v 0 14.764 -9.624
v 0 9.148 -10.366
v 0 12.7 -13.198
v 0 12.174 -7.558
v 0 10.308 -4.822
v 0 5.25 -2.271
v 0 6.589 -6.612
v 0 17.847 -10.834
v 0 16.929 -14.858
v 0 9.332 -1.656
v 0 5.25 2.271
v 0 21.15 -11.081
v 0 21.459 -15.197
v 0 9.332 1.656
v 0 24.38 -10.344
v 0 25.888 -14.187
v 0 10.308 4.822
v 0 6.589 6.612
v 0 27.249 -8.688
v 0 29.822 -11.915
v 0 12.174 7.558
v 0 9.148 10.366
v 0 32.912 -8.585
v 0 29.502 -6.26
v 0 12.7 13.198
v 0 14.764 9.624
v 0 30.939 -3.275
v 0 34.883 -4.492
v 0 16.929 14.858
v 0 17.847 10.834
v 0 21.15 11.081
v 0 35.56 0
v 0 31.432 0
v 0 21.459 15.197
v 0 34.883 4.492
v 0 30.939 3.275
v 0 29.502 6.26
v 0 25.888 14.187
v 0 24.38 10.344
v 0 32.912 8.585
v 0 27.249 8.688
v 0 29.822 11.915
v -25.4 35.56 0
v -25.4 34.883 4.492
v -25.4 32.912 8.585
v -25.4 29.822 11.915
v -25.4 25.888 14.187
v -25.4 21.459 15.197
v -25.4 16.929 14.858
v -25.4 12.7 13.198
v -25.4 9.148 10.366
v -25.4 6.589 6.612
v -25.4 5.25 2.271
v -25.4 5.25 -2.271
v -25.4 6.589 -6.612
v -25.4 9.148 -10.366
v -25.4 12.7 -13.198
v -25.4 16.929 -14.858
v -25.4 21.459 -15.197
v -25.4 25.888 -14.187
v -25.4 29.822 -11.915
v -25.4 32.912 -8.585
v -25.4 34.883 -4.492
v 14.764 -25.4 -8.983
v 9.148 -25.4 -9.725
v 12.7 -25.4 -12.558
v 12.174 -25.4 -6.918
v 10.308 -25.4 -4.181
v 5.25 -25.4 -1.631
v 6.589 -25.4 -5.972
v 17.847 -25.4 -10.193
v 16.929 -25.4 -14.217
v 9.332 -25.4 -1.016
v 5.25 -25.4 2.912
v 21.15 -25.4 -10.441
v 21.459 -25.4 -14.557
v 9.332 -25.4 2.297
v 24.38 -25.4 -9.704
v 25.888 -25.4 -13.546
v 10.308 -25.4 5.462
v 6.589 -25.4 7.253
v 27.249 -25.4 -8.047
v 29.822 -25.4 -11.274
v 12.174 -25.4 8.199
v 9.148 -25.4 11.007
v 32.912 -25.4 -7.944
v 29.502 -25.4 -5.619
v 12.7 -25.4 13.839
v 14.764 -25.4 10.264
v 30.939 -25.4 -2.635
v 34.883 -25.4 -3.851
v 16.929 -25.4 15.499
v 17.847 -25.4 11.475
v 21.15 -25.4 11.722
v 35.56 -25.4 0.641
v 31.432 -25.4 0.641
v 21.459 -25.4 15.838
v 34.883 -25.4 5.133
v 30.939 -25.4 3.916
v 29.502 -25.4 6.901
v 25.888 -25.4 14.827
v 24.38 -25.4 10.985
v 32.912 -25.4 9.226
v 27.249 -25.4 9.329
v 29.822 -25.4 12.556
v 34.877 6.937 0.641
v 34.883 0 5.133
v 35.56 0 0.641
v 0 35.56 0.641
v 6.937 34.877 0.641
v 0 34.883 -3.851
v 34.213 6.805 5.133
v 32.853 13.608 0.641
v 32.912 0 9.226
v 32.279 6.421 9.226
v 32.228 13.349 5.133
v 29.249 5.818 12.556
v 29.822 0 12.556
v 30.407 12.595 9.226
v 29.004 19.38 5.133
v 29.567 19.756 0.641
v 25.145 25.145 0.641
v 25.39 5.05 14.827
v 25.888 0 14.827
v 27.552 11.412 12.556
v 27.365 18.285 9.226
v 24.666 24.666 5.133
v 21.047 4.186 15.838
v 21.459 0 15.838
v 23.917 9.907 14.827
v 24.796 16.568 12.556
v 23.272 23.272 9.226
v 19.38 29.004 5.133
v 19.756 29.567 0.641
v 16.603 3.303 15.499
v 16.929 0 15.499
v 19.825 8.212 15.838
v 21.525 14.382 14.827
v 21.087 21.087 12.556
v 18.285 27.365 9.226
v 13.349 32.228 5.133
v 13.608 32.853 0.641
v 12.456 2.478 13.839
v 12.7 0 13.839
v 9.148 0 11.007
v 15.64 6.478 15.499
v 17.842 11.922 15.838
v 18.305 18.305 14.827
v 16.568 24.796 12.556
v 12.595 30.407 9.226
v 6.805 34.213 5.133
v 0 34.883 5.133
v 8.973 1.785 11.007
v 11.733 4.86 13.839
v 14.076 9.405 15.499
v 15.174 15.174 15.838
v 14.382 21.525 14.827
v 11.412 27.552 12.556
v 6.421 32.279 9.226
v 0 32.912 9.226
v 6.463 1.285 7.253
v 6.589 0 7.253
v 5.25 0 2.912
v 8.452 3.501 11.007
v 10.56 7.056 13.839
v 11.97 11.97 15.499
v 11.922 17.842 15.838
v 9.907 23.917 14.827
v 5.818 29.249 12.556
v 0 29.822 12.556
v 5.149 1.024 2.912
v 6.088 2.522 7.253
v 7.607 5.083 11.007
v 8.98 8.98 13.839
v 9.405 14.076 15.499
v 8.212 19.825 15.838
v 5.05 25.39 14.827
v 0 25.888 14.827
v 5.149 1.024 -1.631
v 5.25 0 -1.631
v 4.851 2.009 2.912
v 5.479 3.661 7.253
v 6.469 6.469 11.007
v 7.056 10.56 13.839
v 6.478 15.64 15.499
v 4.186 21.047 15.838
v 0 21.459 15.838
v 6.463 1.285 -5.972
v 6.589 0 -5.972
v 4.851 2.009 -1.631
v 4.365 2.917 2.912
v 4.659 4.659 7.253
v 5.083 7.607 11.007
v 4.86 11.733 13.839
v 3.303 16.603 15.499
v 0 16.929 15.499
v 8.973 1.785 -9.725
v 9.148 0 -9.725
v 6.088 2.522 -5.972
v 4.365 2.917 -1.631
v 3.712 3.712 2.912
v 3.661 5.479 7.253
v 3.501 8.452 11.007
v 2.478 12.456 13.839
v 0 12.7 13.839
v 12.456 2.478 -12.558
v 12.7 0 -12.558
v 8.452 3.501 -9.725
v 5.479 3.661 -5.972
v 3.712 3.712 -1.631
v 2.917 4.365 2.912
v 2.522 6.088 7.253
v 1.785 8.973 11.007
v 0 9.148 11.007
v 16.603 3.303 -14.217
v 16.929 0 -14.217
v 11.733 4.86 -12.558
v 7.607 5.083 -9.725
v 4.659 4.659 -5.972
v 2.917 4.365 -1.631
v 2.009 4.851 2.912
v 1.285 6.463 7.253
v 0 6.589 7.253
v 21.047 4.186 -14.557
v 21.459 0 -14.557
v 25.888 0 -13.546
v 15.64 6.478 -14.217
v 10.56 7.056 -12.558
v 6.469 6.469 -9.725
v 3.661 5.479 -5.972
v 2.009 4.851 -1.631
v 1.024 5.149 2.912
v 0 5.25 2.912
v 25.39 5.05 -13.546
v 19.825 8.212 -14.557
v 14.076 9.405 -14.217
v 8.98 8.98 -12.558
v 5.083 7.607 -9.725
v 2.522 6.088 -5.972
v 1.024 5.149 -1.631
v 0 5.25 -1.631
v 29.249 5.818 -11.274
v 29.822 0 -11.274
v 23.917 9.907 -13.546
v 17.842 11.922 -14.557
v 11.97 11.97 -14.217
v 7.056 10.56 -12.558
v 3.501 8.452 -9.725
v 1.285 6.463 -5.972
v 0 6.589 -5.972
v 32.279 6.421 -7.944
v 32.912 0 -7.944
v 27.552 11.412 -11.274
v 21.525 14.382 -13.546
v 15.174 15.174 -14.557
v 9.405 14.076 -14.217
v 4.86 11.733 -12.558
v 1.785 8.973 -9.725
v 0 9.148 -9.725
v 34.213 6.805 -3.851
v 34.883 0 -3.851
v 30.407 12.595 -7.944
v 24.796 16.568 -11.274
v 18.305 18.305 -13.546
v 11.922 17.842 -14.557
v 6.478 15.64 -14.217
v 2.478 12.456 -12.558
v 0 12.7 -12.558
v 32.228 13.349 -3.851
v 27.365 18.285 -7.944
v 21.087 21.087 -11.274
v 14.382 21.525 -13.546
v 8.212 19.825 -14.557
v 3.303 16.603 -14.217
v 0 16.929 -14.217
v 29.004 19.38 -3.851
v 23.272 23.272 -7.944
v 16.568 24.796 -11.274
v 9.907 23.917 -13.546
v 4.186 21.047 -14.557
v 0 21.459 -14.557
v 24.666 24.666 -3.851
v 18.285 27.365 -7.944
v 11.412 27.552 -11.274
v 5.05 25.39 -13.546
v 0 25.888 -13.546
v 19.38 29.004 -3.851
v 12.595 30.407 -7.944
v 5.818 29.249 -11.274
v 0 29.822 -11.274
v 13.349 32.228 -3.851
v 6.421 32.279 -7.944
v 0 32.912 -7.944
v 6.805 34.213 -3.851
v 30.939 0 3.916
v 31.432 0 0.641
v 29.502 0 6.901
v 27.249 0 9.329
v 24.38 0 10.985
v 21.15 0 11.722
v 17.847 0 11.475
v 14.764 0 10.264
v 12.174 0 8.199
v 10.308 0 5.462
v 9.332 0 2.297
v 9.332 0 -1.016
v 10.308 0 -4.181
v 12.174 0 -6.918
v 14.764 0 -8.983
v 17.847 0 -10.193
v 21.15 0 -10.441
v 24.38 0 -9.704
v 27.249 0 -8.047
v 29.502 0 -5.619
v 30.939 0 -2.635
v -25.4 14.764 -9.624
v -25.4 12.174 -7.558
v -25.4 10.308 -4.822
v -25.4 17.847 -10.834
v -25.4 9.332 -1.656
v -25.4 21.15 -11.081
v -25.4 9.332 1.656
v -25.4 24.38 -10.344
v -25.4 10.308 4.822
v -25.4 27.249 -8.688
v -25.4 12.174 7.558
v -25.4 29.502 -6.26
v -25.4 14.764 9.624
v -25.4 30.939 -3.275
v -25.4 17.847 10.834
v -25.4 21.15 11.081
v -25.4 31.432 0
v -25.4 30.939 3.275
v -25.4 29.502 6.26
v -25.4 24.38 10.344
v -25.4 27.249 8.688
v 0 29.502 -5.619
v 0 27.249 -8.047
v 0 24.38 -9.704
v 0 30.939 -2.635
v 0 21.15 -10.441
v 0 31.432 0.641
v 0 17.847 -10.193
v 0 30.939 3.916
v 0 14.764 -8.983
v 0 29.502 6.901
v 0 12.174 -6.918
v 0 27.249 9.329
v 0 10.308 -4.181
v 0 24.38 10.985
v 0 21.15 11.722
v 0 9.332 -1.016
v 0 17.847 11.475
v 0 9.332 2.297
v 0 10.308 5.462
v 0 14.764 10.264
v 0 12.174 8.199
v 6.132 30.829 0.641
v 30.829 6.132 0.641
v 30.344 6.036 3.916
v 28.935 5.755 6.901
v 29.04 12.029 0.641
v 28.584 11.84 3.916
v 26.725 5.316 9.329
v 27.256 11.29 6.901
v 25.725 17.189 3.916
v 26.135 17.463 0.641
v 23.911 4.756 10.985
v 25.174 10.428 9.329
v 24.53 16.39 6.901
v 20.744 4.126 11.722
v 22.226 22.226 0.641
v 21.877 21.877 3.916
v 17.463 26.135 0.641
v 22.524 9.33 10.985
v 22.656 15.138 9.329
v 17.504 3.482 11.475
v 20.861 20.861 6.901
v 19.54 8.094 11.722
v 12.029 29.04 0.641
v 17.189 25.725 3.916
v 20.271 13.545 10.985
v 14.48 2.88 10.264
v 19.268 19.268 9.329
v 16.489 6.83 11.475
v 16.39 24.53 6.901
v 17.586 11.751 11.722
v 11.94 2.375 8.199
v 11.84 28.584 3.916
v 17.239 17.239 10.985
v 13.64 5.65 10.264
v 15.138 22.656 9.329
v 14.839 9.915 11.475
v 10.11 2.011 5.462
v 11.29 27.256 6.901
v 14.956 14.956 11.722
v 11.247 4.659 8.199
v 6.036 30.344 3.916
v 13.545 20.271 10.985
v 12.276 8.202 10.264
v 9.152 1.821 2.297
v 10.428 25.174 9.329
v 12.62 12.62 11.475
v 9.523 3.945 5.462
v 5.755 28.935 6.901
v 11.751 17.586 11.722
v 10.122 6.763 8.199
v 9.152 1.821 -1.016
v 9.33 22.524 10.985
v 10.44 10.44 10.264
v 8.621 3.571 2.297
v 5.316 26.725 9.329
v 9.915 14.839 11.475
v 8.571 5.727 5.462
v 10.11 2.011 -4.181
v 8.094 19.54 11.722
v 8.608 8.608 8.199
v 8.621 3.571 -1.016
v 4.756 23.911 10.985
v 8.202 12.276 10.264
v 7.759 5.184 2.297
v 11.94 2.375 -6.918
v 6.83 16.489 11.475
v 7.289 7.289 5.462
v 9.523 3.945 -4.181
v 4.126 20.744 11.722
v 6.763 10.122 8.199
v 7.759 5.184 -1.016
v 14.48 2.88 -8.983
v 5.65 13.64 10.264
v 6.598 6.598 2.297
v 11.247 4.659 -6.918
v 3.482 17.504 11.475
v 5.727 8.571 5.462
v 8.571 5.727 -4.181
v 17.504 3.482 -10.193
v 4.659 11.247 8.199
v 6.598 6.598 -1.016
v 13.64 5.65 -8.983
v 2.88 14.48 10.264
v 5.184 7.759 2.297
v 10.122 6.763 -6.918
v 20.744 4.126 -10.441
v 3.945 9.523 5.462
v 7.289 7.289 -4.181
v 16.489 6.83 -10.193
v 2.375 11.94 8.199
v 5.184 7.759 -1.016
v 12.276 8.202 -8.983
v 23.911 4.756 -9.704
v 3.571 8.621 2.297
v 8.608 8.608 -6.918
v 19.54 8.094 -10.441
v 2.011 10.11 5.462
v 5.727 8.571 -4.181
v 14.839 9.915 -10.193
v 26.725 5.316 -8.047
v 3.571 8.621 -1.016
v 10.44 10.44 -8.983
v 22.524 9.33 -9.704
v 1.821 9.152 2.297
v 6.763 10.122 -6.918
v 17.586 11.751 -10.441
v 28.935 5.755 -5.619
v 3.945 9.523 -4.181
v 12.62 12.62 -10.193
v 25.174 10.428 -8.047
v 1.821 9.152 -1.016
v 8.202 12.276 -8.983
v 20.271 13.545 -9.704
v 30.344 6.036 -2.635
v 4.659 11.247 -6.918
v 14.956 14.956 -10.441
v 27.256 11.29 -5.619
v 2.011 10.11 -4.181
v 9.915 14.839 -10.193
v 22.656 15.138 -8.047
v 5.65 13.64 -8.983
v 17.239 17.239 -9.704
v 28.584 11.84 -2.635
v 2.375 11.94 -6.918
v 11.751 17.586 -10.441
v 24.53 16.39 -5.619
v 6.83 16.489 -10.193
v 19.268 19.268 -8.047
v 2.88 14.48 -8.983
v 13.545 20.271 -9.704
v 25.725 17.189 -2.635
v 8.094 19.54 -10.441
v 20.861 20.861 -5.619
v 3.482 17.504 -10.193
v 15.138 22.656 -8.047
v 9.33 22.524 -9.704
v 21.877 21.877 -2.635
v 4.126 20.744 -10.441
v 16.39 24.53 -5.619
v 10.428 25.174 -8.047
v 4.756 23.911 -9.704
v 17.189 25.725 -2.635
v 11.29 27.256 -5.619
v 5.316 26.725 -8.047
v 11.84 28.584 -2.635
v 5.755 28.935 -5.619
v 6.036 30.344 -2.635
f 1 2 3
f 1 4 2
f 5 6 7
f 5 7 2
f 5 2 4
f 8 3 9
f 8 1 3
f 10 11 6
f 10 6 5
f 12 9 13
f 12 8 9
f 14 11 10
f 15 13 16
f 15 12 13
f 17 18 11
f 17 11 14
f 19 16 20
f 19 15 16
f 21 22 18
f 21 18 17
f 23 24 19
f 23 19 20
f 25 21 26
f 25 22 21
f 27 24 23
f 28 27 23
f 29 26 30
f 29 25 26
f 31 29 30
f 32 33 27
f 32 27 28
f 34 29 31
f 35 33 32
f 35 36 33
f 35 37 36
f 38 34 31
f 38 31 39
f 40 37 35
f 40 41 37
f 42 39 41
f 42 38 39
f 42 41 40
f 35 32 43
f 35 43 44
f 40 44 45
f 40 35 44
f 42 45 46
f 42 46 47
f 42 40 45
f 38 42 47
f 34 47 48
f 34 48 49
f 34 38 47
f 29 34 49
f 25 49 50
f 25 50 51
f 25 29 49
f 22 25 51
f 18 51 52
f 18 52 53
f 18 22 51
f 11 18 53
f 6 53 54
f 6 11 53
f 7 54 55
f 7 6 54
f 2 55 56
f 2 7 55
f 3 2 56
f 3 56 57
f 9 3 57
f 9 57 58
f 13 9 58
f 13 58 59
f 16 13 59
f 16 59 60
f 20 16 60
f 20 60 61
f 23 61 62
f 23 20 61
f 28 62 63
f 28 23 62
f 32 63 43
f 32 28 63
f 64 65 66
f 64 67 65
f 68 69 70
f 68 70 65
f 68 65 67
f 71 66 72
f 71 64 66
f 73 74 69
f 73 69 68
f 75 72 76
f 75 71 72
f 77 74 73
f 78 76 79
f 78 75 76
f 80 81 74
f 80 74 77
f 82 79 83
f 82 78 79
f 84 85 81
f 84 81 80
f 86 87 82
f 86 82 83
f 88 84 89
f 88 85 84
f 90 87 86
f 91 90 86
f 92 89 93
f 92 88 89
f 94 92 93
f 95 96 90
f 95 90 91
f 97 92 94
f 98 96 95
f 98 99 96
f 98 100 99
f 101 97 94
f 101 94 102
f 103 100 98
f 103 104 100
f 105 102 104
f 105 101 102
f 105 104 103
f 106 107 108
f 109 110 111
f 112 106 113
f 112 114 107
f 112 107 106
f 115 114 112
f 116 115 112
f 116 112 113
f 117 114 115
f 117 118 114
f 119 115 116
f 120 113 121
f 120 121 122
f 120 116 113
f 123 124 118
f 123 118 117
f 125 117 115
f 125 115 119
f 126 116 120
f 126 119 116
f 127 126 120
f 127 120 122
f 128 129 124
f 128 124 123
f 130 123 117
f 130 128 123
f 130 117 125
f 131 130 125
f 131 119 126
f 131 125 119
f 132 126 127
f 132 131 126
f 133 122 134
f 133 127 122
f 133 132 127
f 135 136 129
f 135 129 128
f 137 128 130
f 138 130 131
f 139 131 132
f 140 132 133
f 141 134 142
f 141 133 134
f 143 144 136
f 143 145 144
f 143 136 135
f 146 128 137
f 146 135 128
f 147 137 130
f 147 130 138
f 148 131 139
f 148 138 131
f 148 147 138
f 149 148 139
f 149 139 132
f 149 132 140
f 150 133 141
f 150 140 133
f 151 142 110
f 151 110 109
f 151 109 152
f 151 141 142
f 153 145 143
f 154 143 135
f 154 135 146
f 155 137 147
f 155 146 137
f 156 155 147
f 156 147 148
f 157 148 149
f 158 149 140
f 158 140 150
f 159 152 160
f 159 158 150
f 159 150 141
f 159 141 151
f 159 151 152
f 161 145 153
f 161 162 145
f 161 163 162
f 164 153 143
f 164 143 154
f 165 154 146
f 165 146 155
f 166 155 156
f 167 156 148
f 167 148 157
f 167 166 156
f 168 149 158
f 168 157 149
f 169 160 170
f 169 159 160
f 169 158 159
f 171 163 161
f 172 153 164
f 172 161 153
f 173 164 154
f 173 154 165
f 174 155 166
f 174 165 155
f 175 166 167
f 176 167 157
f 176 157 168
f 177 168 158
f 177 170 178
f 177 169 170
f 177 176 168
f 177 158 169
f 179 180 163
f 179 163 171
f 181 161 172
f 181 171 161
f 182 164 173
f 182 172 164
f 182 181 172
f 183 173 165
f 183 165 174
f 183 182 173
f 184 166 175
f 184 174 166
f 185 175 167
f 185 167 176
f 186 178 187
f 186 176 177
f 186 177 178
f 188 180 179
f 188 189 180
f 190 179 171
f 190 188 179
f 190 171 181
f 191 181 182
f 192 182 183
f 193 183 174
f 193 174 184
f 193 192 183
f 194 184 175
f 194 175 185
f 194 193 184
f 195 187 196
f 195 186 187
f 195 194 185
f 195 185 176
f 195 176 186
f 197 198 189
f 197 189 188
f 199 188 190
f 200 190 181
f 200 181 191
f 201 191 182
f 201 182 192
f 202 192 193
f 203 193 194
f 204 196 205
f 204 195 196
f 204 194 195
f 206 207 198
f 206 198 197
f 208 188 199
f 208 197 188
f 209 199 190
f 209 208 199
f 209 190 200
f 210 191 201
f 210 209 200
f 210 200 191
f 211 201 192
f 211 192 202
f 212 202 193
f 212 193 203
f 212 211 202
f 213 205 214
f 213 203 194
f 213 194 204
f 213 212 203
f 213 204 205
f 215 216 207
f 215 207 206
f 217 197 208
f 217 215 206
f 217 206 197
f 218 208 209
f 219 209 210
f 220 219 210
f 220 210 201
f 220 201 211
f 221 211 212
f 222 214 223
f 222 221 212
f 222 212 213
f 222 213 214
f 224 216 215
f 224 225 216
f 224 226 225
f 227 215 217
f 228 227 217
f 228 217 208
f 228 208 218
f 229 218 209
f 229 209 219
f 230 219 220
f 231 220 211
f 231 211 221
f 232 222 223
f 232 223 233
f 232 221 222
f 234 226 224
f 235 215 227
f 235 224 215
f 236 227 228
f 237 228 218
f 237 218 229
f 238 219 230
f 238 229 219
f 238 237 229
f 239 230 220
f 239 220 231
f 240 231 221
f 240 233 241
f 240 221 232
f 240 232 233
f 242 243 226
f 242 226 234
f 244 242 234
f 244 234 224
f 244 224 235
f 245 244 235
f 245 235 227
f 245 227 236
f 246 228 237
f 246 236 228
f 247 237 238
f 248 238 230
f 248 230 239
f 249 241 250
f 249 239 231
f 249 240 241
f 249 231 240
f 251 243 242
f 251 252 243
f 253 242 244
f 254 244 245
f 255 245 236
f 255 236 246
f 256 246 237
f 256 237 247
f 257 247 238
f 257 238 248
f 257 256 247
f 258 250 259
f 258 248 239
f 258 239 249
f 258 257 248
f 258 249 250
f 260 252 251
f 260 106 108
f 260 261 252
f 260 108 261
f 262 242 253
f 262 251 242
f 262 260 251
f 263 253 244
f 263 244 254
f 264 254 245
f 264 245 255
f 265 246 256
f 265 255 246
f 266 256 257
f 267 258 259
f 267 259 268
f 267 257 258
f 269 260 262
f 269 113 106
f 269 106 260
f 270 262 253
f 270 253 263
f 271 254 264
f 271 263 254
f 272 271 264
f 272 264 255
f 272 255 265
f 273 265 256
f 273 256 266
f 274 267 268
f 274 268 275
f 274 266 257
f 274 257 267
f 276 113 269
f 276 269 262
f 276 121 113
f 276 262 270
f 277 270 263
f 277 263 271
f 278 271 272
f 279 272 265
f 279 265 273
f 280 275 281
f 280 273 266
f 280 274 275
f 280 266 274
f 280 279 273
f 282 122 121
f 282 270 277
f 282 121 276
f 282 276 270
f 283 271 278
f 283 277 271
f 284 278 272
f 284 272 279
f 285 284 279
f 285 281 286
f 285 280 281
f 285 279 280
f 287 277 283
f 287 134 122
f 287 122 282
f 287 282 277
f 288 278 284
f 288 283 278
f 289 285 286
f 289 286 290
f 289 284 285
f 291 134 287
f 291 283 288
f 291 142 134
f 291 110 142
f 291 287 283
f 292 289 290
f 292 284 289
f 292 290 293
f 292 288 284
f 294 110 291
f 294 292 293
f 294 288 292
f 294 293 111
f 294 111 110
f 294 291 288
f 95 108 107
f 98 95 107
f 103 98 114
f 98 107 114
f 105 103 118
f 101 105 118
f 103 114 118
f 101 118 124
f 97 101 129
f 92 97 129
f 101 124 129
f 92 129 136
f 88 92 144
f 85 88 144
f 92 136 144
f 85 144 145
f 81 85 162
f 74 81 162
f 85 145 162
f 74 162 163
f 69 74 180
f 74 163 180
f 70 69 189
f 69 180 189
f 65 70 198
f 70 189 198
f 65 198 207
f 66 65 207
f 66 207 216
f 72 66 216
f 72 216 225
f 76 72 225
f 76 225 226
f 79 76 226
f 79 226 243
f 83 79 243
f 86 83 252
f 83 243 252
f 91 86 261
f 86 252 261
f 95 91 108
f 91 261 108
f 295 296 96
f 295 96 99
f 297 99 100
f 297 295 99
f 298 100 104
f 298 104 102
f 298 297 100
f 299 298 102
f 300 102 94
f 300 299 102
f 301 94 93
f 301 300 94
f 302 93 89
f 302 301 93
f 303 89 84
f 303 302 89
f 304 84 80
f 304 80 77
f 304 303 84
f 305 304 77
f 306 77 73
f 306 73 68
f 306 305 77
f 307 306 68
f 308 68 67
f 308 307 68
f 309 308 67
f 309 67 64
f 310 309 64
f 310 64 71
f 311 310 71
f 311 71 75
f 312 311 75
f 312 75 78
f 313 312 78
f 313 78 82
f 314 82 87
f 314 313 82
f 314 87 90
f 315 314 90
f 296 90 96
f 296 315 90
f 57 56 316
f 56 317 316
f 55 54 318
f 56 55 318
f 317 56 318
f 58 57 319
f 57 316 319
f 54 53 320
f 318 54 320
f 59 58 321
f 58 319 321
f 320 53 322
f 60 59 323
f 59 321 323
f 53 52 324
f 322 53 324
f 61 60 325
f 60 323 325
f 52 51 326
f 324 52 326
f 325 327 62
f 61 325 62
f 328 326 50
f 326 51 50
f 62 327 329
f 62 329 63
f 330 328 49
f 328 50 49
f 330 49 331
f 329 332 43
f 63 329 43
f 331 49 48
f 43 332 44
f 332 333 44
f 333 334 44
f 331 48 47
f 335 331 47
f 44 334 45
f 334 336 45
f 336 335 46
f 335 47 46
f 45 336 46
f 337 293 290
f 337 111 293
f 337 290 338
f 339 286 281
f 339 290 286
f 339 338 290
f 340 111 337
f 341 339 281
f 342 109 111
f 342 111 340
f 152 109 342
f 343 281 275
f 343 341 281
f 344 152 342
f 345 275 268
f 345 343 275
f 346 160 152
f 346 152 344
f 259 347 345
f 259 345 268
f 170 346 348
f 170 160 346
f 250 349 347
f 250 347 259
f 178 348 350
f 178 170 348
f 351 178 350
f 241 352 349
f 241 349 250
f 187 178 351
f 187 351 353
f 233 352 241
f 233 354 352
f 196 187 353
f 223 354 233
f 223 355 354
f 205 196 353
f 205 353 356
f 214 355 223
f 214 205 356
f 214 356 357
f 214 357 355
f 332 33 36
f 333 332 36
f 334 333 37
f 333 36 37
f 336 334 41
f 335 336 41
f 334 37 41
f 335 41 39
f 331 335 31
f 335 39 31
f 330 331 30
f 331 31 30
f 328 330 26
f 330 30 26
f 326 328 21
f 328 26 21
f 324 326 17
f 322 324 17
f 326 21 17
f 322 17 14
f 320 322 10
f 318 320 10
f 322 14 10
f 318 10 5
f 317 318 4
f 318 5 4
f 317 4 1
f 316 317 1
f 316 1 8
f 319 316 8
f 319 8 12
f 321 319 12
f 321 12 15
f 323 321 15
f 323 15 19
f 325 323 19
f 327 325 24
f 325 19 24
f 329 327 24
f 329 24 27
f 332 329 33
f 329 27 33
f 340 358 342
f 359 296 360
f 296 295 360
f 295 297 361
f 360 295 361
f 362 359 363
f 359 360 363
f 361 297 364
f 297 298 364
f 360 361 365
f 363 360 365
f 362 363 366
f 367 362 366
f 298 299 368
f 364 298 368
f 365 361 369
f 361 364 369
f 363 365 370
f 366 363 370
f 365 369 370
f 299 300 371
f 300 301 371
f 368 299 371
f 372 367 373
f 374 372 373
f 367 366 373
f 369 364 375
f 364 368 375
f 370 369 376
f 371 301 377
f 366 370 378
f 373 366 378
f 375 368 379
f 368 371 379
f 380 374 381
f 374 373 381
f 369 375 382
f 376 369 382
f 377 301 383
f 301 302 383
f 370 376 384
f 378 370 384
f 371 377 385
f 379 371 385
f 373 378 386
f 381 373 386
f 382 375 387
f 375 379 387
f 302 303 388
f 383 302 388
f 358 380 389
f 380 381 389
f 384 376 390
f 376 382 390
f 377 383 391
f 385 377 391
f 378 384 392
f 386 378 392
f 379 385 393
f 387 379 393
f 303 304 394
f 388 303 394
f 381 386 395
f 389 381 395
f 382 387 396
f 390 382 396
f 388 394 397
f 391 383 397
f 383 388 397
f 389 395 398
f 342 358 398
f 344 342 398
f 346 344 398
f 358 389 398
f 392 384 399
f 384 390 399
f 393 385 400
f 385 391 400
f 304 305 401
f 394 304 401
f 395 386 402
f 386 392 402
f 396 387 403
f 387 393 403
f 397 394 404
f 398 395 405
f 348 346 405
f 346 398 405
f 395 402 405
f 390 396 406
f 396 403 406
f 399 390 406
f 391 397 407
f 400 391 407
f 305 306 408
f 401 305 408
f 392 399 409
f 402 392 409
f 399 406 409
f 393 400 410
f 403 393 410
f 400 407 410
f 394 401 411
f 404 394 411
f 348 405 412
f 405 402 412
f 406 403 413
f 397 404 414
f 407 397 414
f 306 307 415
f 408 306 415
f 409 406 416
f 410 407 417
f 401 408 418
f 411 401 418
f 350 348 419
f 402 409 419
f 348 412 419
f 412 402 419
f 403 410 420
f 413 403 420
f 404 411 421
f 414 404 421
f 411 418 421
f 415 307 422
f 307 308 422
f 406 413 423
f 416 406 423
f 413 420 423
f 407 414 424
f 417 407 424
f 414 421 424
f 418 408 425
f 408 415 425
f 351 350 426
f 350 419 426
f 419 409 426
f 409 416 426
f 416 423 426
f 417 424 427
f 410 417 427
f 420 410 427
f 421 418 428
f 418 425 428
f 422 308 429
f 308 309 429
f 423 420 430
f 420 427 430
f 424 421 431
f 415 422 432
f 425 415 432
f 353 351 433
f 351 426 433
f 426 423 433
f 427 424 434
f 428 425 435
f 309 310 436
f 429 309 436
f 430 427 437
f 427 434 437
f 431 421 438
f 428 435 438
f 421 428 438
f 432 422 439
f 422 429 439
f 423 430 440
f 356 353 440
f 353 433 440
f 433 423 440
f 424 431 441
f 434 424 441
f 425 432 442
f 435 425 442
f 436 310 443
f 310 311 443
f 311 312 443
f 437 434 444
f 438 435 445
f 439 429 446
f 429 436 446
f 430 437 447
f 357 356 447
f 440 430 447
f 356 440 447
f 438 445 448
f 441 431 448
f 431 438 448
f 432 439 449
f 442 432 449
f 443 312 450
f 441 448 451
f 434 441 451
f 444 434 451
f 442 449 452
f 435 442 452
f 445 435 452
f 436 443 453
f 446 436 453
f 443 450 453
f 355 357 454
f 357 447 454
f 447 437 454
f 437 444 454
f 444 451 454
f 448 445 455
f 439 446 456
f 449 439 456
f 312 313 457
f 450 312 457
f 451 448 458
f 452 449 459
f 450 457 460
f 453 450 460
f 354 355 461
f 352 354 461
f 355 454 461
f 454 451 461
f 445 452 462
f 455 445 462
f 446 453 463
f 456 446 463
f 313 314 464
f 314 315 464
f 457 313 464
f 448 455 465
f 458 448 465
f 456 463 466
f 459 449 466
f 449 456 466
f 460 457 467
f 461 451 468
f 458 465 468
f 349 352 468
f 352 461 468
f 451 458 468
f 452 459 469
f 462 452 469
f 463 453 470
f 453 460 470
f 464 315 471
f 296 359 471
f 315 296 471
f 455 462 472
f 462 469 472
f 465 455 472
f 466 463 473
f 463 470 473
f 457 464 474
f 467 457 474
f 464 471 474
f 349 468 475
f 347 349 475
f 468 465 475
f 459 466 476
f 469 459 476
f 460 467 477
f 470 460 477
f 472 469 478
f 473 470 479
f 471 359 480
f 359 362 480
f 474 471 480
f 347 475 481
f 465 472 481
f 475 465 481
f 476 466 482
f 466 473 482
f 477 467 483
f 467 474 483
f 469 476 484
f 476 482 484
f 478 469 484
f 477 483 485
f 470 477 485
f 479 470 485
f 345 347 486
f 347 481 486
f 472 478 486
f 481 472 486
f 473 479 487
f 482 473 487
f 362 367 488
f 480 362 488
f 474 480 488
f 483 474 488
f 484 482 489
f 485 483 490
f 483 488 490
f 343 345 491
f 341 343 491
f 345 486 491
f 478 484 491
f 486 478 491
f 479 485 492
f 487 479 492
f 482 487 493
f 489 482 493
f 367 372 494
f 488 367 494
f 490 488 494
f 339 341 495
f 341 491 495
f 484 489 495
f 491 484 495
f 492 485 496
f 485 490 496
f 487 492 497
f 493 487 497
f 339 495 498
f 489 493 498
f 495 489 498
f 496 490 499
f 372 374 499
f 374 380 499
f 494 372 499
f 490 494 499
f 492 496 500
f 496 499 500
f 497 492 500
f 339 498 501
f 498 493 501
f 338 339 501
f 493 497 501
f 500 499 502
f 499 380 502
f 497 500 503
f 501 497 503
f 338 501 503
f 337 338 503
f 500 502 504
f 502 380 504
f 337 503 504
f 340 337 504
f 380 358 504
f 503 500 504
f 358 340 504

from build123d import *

# Parameters (mm, degrees)
F0_R        = 15.24
F0_R_2      = 11.1125
F2_DEPTH    = 25.4
F1_R        = 15.24
F1_R_2      = 11.1125
F3_DEPTH    = 25.4
F2_FACE_R   = 15.24
F2_FACE_R_2 = 11.1125


with BuildPart() as f2:
    # F0 (on Front) → F2 (new body)
    with BuildSketch(Plane.XZ):
        with Locations((20.32, 0.640698825)):
            Circle(F0_R)
        with Locations((20.32, 0.640698825)):
            Circle(F0_R_2, mode=Mode.SUBTRACT)
    extrude(amount=F2_DEPTH)

    # F5: sweep along a path in F4
    with BuildLine(Plane.XY) as f5_path:
        ThreePointArc((35.4710668325, 0), (25.0818318932, 25.0818318932), (0, 35.4710668325))
    # F2_face (on face) → F5 (sweep)
    with BuildSketch(Plane(origin=(20.32, 0, 0.640698825), x_dir=(1, 0, 0), z_dir=(0, 1, 0))):
        Circle(F2_FACE_R)
        Circle(F2_FACE_R_2, mode=Mode.SUBTRACT)
    sweep(path=f5_path.line)


with BuildPart() as f3:
    # F1 (on Right) → F3 (new body)
    with BuildSketch(Plane.YZ):
        with Locations((20.32, 0)):
            Circle(F1_R)
        with Locations((20.32, 0)):
            Circle(F1_R_2, mode=Mode.SUBTRACT)
    extrude(amount=-F3_DEPTH)


solid = Compound([f2.part, f3.part])
